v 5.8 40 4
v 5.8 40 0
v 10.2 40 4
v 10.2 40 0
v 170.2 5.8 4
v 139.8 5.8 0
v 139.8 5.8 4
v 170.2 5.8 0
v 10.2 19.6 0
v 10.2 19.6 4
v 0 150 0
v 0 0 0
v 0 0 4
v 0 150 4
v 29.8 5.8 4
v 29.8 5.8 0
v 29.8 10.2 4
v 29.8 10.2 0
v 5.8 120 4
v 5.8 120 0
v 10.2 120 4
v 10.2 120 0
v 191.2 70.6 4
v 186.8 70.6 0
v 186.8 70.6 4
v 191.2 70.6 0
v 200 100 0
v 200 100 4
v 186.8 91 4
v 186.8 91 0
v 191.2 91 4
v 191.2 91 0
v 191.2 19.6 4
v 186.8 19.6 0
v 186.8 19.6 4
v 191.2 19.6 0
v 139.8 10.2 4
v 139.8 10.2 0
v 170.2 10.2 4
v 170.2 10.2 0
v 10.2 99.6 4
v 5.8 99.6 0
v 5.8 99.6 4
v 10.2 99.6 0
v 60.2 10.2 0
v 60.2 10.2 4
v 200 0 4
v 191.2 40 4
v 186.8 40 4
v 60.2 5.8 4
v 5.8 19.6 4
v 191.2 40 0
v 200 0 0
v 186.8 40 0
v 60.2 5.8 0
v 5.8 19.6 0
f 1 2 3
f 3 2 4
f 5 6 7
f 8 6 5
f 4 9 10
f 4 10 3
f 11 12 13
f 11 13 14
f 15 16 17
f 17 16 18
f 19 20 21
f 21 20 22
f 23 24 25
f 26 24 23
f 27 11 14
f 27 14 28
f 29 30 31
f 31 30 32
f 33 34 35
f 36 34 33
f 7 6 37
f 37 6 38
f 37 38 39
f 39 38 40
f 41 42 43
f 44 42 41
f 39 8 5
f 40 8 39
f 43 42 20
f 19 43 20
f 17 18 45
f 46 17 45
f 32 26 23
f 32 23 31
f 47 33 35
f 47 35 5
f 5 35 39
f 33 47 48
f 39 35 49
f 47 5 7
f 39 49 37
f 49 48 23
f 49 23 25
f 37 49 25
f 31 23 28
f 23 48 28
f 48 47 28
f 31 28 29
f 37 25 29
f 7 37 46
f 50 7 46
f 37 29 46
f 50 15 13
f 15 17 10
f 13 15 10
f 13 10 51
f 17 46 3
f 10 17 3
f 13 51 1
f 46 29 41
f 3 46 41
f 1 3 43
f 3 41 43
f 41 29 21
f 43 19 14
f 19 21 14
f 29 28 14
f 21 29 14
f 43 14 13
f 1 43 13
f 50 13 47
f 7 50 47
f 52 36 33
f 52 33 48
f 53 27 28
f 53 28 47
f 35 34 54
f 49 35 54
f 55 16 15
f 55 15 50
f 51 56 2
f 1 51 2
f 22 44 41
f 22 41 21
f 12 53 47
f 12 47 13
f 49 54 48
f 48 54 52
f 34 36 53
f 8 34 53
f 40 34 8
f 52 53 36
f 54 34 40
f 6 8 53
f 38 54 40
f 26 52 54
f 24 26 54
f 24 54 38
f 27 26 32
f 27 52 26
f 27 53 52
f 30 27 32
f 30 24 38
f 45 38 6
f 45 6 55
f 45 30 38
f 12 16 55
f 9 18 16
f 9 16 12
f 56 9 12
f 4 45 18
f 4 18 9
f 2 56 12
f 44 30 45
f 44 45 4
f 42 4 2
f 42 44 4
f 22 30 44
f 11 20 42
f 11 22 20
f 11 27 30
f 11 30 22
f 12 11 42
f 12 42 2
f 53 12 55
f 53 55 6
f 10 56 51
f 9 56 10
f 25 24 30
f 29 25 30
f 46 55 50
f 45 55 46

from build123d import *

# Parameters (mm, degrees)
SKETCH_1_W      = 4.4
SKETCH_1_H      = 20.4
SKETCH_1_W_2    = 30.4
SKETCH_1_H_2    = 4.4
EXTRUDE_1_DEPTH = 4


with BuildPart() as part:
    # Эскиз1 → Бобышка-Вытянуть1 (new body)
    with BuildSketch(Plane.XY):
        Polygon((0, 0), (0, 150), (200, 100), (200, 0), align=None)
        with Locations((189, 29.8)):
            Rectangle(SKETCH_1_W, SKETCH_1_H, mode=Mode.SUBTRACT)
        with Locations((155, 8)):
            Rectangle(SKETCH_1_W_2, SKETCH_1_H_2, mode=Mode.SUBTRACT)
        with Locations((45, 8)):
            Rectangle(SKETCH_1_W_2, SKETCH_1_H_2, mode=Mode.SUBTRACT)
        with Locations((8, 109.8)):
            Rectangle(SKETCH_1_W, SKETCH_1_H, mode=Mode.SUBTRACT)
        with Locations((189, 80.8)):
            Rectangle(SKETCH_1_W, SKETCH_1_H, mode=Mode.SUBTRACT)
        with Locations((8, 29.8)):
            Rectangle(SKETCH_1_W, SKETCH_1_H, mode=Mode.SUBTRACT)
    extrude(amount=EXTRUDE_1_DEPTH)


solid = part.part
